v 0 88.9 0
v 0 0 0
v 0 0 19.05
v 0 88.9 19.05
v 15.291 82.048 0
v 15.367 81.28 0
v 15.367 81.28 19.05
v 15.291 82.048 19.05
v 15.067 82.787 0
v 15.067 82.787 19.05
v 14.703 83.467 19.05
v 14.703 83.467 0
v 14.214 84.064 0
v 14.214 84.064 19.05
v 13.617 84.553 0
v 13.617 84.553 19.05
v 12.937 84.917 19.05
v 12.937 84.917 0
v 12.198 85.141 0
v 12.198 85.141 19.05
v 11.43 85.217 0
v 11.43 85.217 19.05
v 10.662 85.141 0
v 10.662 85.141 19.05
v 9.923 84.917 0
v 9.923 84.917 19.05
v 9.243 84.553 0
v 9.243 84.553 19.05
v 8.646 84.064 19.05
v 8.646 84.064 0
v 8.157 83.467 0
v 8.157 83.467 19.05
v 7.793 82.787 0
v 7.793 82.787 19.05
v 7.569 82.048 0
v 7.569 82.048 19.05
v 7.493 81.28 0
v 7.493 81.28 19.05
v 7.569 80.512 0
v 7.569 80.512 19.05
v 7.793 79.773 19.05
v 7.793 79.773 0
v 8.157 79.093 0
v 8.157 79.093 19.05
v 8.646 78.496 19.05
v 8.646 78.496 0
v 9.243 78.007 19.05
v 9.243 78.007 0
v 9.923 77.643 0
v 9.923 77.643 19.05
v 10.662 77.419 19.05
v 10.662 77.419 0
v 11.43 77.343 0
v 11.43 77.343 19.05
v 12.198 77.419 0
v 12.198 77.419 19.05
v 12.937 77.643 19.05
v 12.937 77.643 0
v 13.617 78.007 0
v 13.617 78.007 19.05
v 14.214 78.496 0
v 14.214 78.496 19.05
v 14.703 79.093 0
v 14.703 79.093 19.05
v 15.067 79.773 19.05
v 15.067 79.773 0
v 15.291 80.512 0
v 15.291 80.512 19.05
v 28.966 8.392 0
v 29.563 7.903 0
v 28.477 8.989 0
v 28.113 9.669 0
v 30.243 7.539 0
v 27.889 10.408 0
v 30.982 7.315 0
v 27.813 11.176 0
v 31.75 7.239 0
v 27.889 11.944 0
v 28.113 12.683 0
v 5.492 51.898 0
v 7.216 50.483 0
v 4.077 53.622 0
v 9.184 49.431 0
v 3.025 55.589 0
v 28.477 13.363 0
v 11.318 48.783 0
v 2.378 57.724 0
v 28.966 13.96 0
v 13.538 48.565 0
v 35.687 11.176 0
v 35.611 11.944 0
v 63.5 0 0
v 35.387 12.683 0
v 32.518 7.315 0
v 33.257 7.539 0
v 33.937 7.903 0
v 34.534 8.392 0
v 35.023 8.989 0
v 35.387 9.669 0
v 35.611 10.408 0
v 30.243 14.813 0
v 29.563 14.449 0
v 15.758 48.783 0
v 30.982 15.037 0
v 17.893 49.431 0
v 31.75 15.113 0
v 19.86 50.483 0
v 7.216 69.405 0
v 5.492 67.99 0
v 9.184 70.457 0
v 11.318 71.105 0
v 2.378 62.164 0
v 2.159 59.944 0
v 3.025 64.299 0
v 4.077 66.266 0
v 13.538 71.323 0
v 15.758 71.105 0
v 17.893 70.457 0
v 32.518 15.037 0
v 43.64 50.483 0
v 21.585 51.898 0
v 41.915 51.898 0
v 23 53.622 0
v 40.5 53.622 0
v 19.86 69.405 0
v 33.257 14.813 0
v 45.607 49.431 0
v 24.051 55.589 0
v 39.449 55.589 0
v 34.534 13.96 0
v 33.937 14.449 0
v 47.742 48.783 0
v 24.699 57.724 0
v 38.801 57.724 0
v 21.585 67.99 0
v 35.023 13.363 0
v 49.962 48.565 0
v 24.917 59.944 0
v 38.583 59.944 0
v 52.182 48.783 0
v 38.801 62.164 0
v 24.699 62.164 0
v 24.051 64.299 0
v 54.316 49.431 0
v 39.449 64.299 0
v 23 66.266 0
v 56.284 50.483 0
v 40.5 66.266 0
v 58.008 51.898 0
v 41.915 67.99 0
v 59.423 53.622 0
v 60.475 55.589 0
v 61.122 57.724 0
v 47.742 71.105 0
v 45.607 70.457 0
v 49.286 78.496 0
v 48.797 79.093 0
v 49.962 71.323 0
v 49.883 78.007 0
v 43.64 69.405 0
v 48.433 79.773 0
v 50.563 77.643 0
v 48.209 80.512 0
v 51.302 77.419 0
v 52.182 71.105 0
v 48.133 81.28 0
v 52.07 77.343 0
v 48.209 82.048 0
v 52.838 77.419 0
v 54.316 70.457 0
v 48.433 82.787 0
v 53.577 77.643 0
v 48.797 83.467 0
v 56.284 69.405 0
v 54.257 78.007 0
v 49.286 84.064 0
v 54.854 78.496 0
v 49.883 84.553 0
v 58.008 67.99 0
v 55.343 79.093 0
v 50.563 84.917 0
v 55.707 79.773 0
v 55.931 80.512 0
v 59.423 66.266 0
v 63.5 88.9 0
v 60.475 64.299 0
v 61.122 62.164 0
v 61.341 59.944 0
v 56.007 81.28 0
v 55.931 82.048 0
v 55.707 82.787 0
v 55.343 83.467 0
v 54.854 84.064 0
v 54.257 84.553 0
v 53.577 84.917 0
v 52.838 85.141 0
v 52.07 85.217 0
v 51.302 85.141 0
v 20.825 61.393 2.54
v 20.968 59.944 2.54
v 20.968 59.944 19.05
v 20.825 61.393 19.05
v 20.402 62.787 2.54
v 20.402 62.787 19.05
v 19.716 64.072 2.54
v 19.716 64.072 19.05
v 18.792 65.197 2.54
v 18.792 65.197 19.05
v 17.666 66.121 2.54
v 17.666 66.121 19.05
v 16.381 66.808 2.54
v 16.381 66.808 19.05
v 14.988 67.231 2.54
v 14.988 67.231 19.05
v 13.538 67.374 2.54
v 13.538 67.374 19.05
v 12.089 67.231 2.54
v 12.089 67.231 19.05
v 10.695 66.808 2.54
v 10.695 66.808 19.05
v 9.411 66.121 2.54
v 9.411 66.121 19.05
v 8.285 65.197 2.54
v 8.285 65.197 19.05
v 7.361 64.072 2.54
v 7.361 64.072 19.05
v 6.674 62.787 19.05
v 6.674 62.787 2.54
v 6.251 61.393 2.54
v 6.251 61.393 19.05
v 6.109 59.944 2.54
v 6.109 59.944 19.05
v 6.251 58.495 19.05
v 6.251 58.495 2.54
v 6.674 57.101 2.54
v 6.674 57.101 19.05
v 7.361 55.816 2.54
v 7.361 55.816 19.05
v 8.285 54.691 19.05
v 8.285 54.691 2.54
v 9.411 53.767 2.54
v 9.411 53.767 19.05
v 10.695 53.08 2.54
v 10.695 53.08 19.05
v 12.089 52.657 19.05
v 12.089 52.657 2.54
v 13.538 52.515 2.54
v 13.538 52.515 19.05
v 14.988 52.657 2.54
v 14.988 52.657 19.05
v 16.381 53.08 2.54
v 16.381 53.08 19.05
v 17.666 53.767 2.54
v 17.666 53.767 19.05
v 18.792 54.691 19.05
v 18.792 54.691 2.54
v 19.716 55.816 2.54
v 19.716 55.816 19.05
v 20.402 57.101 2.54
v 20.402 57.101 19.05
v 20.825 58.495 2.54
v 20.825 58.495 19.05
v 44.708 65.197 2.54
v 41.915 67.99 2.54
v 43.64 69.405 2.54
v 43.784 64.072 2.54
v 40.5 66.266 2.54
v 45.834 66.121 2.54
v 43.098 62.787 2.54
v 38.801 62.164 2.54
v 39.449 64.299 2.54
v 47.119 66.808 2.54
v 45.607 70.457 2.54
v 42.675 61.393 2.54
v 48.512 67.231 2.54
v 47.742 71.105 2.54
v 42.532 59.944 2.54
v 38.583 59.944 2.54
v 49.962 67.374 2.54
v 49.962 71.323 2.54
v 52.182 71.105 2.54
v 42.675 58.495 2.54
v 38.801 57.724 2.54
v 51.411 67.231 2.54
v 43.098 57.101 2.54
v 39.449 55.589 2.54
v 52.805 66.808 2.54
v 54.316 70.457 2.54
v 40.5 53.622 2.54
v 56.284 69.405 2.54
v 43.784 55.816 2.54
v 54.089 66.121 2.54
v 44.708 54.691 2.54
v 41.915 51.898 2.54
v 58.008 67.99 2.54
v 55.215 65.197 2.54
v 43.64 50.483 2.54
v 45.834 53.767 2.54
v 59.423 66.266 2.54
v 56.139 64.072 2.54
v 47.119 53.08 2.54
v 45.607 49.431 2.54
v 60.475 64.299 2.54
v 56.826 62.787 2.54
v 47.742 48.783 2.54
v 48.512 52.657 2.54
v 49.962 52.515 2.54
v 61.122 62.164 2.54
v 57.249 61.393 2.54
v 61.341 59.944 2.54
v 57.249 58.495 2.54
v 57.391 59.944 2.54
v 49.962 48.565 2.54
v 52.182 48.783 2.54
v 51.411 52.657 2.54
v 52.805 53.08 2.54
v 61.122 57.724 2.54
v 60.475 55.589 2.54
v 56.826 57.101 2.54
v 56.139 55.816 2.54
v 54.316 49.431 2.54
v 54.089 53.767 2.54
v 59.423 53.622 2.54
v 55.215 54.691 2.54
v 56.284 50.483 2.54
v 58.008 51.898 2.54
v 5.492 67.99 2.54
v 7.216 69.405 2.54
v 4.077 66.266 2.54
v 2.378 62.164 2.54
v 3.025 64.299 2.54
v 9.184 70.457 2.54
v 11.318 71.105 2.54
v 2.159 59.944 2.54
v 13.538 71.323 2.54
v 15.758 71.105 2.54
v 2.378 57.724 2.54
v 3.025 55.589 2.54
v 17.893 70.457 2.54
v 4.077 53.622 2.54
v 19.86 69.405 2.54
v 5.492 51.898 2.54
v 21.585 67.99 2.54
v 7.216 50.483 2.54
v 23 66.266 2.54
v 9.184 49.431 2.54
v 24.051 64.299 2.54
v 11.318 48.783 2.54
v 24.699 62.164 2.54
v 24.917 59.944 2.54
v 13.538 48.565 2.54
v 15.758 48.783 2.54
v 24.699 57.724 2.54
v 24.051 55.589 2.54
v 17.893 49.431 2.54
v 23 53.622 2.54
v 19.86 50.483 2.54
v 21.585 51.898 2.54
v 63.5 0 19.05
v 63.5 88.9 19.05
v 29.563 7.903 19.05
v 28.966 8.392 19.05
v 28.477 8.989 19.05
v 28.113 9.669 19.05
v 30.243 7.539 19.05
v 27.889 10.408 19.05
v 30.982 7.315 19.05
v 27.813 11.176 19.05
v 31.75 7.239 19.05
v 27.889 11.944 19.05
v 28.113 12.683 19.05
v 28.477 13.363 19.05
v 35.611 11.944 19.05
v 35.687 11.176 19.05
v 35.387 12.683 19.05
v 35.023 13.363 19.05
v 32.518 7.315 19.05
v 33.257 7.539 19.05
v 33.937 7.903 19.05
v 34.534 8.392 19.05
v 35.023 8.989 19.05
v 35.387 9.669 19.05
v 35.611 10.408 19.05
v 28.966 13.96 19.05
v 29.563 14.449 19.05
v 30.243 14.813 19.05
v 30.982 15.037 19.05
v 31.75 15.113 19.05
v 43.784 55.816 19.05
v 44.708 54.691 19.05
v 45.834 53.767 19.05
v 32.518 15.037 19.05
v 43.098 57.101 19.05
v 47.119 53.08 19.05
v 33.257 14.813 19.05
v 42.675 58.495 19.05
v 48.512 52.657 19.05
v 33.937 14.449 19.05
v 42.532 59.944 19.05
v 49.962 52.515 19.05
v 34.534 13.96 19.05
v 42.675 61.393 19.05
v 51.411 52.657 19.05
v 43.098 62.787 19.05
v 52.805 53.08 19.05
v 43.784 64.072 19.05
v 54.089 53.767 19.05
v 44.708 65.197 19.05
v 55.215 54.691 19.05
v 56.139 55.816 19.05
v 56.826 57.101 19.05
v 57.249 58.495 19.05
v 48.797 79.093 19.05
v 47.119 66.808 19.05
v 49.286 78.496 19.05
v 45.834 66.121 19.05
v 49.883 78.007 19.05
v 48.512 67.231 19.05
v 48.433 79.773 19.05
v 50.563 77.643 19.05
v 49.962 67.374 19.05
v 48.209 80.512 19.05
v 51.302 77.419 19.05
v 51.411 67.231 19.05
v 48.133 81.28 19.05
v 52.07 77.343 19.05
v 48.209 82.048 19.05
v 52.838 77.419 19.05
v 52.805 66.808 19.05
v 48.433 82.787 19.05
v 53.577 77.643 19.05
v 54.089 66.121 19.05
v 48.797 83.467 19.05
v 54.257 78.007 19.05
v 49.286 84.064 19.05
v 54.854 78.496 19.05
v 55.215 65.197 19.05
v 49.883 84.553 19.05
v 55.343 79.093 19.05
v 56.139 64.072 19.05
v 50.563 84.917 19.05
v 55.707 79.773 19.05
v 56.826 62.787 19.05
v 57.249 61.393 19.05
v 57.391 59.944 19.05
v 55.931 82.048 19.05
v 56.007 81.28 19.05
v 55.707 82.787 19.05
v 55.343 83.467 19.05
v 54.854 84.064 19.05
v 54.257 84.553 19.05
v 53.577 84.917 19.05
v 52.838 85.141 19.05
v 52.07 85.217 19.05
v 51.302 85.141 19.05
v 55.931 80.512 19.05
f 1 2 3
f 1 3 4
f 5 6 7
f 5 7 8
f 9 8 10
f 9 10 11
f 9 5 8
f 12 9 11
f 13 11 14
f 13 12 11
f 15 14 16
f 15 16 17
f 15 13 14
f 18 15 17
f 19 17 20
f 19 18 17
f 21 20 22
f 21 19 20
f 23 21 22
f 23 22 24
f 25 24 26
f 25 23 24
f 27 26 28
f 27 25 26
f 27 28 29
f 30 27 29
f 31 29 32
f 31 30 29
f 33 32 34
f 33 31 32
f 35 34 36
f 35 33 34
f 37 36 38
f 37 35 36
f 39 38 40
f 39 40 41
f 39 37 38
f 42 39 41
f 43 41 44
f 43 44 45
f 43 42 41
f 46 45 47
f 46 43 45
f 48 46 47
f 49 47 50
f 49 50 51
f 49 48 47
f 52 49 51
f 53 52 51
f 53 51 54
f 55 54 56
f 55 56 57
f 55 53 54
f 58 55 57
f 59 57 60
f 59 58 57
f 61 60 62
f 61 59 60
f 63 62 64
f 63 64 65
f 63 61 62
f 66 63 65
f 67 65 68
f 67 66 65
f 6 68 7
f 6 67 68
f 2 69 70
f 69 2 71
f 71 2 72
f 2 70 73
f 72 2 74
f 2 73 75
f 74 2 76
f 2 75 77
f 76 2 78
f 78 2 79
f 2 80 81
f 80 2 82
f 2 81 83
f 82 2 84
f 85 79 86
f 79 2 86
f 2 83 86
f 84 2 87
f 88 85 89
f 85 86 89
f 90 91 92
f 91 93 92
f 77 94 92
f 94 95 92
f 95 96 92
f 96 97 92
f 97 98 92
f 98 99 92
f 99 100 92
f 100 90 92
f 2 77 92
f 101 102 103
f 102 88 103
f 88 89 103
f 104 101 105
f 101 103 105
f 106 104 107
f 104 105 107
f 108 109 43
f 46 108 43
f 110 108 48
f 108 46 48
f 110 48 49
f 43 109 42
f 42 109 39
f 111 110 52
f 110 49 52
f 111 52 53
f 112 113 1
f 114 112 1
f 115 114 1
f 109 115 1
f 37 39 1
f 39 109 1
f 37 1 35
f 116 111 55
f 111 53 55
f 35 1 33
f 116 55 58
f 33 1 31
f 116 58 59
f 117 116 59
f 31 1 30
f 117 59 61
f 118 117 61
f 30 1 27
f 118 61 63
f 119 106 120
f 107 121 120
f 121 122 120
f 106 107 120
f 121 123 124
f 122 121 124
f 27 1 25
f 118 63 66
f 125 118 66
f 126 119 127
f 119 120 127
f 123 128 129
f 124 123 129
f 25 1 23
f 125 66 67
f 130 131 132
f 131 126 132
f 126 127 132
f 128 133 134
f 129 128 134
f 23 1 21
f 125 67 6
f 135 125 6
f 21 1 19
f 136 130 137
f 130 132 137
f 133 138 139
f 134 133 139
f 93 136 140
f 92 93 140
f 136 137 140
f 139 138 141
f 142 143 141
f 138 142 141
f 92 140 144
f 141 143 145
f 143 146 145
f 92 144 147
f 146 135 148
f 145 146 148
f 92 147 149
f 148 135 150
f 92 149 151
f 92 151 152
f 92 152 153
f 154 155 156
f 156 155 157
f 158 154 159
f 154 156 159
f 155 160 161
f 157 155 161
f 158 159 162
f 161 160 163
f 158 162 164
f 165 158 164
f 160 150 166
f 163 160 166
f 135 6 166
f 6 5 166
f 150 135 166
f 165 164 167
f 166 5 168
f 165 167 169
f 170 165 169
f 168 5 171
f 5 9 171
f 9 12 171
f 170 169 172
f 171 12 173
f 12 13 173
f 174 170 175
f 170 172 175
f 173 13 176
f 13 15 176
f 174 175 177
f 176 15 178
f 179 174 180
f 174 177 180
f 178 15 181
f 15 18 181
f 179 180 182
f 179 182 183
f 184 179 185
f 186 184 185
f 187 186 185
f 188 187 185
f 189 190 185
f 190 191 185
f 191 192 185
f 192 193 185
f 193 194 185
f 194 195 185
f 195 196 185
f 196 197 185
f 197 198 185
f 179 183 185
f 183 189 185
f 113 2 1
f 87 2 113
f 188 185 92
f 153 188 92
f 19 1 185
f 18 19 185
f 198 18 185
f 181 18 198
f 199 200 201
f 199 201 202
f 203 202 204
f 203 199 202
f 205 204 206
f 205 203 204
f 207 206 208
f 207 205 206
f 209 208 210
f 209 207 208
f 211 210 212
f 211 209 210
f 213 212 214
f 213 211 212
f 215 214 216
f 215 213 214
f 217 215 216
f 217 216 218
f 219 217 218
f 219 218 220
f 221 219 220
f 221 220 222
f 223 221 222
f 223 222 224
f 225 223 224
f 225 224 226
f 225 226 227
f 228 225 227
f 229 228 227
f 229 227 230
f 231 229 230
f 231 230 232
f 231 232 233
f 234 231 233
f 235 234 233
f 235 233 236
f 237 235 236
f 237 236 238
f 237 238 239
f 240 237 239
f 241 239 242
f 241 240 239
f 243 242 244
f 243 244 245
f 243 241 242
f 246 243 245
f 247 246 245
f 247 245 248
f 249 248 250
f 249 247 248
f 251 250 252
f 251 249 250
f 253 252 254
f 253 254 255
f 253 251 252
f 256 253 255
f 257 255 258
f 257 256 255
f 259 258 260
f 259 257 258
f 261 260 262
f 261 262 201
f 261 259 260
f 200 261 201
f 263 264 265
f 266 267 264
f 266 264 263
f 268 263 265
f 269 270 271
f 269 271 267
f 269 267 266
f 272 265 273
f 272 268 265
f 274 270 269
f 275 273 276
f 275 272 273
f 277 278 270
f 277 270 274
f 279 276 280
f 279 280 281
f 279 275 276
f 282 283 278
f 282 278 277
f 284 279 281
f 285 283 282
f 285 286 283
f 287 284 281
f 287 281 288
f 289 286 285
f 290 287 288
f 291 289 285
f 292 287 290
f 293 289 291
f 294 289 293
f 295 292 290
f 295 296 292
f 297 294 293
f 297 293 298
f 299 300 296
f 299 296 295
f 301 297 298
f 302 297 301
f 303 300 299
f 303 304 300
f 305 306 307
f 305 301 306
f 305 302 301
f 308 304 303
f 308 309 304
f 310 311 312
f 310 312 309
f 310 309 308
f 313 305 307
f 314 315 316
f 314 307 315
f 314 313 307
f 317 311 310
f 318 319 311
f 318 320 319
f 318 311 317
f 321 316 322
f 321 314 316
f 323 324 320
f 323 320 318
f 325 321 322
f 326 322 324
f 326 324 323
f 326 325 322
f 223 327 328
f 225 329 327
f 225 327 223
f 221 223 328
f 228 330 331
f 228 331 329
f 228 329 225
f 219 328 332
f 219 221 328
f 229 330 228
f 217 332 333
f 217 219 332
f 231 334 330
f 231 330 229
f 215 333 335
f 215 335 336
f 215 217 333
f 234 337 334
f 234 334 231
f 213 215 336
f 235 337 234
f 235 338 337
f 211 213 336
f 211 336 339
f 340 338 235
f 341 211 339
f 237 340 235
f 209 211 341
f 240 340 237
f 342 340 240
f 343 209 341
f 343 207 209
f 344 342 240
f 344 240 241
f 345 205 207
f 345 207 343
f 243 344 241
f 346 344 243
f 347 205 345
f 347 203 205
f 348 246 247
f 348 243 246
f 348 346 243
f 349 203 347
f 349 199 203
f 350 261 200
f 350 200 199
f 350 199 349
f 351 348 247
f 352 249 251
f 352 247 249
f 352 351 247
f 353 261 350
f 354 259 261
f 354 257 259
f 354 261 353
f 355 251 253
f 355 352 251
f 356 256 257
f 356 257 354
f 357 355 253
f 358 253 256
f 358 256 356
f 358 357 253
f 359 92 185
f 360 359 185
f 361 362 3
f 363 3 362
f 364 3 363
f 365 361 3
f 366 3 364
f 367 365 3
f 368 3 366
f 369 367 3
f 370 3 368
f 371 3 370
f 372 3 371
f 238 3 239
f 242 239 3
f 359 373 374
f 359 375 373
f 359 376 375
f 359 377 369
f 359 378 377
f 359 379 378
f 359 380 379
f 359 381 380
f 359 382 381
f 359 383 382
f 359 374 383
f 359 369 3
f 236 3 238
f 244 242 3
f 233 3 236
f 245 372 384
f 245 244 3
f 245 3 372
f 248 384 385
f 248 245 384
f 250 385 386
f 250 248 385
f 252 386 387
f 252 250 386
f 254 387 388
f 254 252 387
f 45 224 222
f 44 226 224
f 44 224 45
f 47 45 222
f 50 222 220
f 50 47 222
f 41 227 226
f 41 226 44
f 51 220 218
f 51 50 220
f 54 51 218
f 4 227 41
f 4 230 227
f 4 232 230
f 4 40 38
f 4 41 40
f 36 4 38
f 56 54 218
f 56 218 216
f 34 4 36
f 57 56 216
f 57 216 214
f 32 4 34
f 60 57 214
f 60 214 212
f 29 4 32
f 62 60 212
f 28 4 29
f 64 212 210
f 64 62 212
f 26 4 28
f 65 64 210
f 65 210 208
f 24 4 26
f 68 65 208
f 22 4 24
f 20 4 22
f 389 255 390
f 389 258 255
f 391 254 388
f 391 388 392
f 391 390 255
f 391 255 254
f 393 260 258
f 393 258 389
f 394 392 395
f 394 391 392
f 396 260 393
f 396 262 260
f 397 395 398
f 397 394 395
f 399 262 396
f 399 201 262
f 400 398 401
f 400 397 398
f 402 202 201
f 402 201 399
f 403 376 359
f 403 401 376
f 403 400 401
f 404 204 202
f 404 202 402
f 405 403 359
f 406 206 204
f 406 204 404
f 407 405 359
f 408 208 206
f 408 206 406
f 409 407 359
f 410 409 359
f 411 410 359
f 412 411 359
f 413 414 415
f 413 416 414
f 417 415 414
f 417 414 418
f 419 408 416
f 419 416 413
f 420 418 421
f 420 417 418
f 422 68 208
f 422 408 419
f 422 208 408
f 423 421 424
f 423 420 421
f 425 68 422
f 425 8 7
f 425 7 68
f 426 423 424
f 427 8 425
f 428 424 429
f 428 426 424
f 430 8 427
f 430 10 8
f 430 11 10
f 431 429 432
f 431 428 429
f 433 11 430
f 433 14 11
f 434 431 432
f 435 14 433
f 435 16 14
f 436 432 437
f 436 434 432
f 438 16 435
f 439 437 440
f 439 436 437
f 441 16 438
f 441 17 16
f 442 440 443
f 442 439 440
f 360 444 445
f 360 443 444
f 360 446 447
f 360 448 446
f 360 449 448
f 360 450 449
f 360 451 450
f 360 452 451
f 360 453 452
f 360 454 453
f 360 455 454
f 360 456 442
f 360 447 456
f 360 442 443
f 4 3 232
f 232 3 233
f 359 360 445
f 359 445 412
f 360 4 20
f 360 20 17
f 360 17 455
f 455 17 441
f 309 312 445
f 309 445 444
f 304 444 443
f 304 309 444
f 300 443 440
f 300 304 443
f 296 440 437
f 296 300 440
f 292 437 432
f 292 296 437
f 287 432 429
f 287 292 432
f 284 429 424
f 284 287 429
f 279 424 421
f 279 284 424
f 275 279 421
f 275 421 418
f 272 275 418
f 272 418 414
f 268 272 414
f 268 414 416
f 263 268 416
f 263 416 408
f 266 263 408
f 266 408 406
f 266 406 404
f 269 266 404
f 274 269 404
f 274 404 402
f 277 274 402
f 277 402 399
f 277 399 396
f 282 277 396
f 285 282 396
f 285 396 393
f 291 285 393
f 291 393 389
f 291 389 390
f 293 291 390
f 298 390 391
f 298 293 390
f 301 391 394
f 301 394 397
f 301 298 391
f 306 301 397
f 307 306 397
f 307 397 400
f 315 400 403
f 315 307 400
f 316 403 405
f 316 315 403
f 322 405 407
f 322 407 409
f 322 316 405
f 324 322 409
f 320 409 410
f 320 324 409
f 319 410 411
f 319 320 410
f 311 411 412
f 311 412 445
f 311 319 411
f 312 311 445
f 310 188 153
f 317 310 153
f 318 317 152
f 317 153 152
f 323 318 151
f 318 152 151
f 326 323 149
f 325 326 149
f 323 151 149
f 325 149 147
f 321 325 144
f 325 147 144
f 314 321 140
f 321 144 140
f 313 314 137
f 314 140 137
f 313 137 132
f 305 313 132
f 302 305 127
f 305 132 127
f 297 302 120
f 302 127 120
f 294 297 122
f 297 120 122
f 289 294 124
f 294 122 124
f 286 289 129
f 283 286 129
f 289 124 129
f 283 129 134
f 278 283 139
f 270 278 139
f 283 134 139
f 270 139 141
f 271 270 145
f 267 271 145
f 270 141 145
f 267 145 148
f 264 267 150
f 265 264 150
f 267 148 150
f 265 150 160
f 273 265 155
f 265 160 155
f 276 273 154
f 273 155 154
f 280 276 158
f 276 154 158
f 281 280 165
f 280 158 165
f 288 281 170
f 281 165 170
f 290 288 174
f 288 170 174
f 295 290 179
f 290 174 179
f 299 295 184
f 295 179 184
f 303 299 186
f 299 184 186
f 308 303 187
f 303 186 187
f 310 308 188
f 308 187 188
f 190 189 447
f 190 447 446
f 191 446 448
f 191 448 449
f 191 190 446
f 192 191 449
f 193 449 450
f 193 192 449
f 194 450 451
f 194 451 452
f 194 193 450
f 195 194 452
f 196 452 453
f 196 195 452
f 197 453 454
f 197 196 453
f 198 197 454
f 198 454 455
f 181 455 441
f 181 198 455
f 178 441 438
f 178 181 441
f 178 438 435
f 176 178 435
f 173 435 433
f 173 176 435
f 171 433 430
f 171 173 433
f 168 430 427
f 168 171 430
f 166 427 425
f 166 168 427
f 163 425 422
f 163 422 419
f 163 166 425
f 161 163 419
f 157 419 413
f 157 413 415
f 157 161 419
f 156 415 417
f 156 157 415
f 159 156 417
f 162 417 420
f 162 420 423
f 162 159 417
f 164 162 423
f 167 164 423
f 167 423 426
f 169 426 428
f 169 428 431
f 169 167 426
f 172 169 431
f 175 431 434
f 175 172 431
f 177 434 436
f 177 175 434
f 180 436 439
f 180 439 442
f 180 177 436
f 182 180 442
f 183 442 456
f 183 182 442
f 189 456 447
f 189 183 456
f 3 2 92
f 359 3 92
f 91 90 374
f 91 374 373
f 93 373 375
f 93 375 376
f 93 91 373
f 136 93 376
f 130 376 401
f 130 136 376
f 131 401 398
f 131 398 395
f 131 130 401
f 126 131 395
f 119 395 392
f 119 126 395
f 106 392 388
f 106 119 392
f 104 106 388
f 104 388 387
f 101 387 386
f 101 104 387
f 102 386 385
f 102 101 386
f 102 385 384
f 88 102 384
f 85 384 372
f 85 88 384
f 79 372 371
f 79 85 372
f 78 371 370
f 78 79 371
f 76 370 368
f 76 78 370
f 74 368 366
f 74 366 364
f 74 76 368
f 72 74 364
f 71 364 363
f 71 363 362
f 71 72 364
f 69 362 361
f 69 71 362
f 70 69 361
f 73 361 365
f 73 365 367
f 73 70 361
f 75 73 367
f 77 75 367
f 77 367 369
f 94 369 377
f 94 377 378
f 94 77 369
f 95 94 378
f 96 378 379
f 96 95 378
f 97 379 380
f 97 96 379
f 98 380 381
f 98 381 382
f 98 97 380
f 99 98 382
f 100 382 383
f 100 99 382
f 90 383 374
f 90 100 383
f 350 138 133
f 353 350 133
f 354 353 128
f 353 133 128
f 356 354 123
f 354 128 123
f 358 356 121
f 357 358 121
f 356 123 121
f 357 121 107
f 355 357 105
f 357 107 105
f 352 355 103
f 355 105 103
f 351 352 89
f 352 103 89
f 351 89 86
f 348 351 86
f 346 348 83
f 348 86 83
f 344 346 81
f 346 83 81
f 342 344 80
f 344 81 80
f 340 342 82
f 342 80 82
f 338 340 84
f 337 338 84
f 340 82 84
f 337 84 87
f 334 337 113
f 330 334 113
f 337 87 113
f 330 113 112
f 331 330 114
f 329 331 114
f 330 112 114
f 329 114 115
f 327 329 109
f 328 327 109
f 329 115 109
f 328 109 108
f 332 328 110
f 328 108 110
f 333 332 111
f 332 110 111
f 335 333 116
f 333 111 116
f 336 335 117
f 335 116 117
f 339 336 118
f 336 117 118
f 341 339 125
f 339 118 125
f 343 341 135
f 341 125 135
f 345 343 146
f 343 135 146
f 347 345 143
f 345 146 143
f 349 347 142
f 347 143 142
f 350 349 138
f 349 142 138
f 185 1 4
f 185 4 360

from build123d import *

# Parameters (mm, degrees)
F0_W     = 63.5
F0_H     = 88.9
F0_R     = 3.937
F0_R_2   = 7.4295
F1_DEPTH = 19.05
F2_R     = 11.3792
F2_R_2   = 7.4295
F3_DEPTH = 2.54


with BuildPart() as f1:
    # F0 (on Top) → F1 (new body)
    with BuildSketch(Plane.XY):
        with Locations((31.75, 44.45)):
            Rectangle(F0_W, F0_H)
        with Locations((31.75, 11.176)):
            Circle(F0_R, mode=Mode.SUBTRACT)
        with Locations((13.5382, 59.944)):
            Circle(F0_R_2, mode=Mode.SUBTRACT)
        with Locations((11.43, 81.28)):
            Circle(F0_R, mode=Mode.SUBTRACT)
        with Locations((49.9618, 59.944)):
            Circle(F0_R_2, mode=Mode.SUBTRACT)
        with Locations((52.07, 81.28)):
            Circle(F0_R, mode=Mode.SUBTRACT)
    extrude(amount=F1_DEPTH)

    # F2 (on face) → F3 (cut)
    with BuildSketch(Plane(origin=(0, 0, 0), x_dir=(1, 0, 0), z_dir=(0, 0, -1))):
        with Locations((49.9618, -59.944)):
            Circle(F2_R)
        with Locations((49.9618, -59.944)):
            Circle(F2_R_2, mode=Mode.SUBTRACT)
        with Locations((13.5382, -59.944)):
            Circle(F2_R)
        with Locations((13.5382, -59.944)):
            Circle(F2_R_2, mode=Mode.SUBTRACT)
    extrude(amount=-F3_DEPTH, mode=Mode.SUBTRACT)


with BuildPart() as f4_1:
    # F4: copy of F1
    add(f1.part.moved(Location((-152.4, 0, 0))))


solid = f1.part
